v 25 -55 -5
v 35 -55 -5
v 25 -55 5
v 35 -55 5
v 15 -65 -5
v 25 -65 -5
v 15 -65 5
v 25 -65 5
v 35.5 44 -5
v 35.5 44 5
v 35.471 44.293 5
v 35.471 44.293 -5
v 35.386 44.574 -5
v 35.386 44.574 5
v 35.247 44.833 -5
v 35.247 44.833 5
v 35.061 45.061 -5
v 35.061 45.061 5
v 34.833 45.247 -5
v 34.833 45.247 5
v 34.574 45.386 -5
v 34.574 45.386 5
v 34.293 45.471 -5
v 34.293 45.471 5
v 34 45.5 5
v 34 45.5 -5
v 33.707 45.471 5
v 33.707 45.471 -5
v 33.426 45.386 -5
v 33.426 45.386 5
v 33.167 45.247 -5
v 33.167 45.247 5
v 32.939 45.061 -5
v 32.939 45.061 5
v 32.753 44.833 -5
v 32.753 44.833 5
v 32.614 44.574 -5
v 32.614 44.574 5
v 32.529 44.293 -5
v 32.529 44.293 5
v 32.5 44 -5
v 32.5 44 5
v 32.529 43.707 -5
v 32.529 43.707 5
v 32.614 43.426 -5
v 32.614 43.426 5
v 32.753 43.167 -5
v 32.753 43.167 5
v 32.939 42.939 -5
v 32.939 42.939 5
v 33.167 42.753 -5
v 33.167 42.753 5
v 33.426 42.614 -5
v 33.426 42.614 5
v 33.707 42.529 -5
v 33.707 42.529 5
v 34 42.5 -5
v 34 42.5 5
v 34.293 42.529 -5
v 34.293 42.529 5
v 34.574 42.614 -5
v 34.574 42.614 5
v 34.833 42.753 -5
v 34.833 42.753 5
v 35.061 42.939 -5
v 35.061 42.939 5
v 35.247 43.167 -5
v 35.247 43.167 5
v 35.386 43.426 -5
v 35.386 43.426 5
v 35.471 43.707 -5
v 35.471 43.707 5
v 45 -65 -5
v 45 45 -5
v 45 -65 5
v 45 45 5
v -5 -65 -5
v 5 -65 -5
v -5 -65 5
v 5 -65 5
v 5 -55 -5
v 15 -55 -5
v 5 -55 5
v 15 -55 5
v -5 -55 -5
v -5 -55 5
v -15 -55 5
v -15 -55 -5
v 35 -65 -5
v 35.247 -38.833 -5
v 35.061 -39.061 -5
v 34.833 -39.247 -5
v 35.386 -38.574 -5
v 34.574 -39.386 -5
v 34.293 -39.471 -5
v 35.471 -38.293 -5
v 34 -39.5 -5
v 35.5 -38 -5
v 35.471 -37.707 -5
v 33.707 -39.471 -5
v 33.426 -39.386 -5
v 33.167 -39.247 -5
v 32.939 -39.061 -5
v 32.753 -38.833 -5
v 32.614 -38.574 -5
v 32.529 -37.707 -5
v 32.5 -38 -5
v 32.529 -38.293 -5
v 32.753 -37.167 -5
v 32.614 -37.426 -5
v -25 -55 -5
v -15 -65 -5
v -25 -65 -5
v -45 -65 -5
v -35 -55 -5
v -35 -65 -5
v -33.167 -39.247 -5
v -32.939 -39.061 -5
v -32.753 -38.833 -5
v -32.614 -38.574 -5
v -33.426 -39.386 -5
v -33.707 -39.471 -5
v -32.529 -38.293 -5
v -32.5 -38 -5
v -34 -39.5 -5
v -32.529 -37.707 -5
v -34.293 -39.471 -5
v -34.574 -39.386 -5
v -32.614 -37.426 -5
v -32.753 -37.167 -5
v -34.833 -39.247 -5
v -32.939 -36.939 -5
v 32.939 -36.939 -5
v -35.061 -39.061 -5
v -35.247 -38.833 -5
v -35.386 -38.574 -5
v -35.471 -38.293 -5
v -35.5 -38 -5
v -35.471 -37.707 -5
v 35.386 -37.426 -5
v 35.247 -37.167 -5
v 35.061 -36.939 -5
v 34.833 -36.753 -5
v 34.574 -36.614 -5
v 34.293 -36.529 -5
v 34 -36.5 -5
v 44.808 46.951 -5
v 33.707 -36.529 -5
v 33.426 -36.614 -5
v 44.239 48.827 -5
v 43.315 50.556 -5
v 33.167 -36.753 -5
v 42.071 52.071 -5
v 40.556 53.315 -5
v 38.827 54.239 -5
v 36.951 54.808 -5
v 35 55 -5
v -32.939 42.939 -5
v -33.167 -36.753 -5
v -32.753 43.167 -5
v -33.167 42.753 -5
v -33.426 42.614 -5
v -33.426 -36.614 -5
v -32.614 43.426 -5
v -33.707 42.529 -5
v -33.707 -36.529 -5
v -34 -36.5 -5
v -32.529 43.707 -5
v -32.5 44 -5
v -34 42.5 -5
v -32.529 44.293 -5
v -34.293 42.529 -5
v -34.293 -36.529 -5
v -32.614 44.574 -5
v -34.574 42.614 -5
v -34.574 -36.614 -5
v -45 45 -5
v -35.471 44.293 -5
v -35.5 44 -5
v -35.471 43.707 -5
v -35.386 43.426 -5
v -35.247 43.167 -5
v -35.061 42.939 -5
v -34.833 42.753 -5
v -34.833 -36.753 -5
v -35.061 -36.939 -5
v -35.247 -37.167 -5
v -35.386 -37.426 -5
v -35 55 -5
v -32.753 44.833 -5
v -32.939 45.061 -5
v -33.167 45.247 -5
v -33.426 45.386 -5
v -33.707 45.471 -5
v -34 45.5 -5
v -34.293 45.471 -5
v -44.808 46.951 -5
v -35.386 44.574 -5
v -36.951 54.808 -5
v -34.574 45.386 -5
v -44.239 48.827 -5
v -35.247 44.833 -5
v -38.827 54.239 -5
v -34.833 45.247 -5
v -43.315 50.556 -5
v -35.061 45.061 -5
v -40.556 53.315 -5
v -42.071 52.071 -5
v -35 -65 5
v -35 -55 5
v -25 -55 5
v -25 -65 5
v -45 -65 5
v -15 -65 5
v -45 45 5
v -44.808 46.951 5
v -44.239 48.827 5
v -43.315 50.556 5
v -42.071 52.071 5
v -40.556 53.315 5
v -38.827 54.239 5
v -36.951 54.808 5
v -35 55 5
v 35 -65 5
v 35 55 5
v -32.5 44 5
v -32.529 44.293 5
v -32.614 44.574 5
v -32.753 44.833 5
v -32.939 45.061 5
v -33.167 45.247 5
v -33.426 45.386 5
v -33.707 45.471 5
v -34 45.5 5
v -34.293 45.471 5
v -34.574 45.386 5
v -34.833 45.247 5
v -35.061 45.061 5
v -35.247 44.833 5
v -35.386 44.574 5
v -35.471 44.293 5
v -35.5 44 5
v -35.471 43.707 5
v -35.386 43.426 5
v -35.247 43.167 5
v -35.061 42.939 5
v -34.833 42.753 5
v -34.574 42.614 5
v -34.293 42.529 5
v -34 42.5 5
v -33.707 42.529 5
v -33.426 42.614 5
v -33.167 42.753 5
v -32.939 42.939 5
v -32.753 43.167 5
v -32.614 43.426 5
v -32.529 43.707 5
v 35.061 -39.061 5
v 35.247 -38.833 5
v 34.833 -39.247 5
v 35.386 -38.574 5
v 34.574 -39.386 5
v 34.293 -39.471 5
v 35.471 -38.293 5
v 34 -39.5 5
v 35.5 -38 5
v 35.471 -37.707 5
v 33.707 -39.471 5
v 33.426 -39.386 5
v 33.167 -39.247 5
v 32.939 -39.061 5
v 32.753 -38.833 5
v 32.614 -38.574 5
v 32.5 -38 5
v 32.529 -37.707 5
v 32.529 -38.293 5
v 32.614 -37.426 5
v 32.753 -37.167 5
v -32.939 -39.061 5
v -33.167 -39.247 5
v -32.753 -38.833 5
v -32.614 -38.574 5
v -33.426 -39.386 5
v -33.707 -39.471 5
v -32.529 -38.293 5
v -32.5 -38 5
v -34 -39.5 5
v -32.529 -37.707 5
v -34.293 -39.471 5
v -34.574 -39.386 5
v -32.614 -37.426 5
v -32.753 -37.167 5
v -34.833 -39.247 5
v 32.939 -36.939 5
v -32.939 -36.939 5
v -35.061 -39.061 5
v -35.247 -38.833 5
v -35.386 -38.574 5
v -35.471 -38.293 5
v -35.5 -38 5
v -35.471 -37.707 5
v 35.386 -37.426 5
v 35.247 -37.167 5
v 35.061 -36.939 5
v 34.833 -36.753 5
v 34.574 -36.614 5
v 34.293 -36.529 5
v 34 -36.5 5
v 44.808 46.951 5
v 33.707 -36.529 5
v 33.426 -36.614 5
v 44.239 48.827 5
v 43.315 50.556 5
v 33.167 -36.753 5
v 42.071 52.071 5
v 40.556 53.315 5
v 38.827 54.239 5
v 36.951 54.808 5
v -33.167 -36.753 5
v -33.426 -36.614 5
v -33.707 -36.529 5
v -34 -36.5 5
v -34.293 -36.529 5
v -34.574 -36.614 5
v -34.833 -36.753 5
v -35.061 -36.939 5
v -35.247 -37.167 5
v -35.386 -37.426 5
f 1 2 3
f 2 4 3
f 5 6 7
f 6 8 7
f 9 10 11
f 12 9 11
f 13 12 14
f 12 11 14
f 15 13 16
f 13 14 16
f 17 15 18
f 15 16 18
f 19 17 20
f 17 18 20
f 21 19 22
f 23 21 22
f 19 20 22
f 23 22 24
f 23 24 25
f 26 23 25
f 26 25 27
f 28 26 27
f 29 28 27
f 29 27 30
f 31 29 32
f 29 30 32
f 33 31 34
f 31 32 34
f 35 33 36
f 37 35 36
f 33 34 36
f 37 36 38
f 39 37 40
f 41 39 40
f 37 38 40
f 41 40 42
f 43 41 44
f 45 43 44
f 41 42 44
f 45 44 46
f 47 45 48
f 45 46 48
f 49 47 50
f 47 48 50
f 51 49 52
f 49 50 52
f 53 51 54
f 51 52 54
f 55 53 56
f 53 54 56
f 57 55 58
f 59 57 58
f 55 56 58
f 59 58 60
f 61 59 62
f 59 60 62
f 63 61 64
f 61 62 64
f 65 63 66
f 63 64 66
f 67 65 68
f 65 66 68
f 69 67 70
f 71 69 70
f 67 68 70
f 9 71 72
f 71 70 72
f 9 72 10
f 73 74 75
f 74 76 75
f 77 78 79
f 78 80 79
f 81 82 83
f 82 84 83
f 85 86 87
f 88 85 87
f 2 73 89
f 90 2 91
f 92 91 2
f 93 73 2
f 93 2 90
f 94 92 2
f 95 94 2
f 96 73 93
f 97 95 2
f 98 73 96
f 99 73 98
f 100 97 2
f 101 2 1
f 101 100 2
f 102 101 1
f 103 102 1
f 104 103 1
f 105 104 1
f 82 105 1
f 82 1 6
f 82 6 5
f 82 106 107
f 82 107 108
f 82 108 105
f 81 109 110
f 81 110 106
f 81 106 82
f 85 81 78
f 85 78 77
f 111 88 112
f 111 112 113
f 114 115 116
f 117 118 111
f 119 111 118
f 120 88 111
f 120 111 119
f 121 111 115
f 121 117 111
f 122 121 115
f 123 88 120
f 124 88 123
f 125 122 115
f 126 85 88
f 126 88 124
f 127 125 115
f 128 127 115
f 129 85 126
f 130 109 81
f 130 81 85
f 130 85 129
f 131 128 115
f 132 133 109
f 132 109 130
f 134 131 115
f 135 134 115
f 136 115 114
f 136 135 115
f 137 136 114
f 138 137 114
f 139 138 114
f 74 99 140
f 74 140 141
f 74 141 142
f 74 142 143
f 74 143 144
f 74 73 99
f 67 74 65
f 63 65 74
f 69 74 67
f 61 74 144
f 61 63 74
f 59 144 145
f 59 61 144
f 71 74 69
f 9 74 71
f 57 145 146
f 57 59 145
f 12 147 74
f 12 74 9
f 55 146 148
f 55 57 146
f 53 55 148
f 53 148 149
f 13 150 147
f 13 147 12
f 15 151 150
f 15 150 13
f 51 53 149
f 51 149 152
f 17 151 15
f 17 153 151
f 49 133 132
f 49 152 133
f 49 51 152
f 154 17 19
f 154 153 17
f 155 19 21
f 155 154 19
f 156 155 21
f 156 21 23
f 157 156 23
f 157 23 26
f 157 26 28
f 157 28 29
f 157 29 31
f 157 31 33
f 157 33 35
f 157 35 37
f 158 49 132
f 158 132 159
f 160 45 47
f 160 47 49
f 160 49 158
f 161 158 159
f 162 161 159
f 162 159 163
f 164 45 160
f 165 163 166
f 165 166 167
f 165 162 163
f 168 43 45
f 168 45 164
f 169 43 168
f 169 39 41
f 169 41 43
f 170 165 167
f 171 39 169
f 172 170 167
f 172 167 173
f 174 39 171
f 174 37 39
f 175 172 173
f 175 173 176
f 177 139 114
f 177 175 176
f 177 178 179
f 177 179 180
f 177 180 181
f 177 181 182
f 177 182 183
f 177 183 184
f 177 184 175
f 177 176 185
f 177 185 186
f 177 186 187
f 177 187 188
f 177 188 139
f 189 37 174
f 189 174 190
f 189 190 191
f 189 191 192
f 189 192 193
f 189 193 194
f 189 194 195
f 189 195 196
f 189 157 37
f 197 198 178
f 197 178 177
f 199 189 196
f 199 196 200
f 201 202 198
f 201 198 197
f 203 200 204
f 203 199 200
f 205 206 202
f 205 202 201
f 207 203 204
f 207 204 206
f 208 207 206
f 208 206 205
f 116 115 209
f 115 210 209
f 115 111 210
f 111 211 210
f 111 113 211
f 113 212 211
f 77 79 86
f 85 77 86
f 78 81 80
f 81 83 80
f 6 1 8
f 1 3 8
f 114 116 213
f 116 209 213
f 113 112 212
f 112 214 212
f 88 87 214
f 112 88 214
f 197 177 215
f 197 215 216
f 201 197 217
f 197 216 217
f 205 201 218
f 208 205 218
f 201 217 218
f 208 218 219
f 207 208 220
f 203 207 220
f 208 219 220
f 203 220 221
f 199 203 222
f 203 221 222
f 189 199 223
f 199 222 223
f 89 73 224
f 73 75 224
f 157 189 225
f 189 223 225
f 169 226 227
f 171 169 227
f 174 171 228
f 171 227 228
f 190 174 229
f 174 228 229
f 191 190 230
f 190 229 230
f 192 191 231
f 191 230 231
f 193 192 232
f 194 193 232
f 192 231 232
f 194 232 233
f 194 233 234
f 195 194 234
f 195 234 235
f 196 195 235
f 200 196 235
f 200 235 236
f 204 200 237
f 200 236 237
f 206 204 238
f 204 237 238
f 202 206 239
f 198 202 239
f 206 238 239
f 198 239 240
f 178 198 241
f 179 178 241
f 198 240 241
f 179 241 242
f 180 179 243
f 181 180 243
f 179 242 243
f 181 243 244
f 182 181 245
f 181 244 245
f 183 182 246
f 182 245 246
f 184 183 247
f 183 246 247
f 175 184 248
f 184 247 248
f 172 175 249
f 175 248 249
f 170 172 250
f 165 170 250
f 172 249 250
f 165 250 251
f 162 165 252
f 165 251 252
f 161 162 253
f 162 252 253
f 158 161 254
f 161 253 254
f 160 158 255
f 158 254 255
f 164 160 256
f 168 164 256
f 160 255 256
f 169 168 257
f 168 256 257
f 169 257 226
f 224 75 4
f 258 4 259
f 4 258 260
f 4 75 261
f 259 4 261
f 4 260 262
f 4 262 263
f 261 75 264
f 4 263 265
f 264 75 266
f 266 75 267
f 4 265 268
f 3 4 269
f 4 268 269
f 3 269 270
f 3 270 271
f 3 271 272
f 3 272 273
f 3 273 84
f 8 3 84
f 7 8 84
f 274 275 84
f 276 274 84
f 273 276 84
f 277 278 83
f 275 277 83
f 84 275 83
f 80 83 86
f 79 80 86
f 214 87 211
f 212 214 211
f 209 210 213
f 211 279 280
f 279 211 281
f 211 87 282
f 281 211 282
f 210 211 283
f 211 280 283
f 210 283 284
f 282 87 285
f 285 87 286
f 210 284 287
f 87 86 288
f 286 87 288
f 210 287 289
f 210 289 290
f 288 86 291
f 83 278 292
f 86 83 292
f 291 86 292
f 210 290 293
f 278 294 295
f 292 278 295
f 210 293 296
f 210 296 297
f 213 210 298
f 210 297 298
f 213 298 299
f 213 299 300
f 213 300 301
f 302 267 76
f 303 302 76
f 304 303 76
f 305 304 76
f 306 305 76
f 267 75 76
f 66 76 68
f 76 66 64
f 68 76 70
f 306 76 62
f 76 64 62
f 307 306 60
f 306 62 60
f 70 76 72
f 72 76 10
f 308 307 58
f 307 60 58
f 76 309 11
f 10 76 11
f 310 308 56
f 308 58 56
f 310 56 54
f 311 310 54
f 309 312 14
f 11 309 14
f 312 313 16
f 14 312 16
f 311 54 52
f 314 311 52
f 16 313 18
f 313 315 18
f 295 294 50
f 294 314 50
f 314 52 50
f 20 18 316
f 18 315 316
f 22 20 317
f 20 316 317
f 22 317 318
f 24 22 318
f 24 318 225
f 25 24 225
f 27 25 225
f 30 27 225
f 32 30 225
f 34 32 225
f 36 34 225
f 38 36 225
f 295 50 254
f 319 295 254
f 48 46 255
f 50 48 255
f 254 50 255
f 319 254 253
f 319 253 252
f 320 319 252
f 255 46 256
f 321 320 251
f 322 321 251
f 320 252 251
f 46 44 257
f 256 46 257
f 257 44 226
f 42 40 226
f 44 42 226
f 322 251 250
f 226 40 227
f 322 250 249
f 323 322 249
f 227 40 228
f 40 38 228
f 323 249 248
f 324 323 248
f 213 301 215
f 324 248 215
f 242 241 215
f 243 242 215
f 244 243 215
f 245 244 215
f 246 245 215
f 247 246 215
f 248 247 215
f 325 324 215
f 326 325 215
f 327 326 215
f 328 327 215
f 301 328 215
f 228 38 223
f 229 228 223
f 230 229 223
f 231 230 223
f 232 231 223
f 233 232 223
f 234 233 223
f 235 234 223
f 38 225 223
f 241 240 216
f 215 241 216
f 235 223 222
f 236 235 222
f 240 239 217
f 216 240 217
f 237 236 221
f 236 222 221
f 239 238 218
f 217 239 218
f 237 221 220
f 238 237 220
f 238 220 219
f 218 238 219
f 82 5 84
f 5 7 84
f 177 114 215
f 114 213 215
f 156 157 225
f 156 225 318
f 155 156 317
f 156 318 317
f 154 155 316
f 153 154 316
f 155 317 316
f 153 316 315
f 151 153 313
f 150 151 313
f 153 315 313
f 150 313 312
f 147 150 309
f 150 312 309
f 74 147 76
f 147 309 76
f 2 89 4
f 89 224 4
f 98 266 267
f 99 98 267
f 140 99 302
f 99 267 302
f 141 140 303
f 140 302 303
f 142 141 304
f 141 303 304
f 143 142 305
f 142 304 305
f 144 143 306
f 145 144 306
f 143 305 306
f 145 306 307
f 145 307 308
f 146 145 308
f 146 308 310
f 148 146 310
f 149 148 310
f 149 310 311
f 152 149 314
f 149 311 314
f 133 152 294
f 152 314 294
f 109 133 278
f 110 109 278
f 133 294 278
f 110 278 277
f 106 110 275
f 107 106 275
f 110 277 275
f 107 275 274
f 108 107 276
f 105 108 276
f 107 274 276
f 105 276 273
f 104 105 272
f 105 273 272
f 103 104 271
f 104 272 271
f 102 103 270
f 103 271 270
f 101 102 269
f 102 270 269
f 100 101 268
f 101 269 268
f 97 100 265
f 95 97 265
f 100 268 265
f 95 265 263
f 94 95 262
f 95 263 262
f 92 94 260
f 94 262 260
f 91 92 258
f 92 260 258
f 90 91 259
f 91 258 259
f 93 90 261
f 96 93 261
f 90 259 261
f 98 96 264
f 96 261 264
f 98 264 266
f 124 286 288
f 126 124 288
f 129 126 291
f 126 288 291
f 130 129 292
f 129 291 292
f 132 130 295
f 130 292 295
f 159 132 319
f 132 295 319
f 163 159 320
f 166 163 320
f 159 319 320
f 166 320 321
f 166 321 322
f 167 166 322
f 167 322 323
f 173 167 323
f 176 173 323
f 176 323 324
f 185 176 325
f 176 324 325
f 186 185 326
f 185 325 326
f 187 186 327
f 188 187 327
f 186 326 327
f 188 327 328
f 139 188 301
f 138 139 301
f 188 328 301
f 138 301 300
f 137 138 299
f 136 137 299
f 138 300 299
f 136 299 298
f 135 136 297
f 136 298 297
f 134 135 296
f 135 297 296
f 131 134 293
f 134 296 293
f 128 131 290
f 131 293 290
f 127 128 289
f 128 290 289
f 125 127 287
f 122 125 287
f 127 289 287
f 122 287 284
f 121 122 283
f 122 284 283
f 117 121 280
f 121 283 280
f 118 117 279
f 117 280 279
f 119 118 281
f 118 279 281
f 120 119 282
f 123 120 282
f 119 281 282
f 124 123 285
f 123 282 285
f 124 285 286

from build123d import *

# Parameters (mm, degrees)
EXTRUDE_2_DEPTH     = 5
SKETCH_3_R          = 1.5
CUT_EXTRUDE_1_DEPTH = 10


with BuildPart() as part:
    # Эскиз1 → Бобышка-Вытянуть2 (new, symmetric)
    with BuildSketch(Plane.XY):
        with BuildLine():
            Line((-15, -55), (-15, -65))
            Line((-15, -65), (-25, -65))
            Line((-25, -65), (-25, -55))
            Line((-25, -55), (-35, -55))
            Line((-35, -55), (-35, -65))
            Line((-35, -65), (-45, -65))
            Line((-45, -65), (-45, -55))
            Line((-45, -55), (-45, 45))
            ThreePointArc((-45, 45), (-42.071067812, 52.071067812), (-35, 55))
            Line((-35, 55), (35, 55))
            ThreePointArc((35, 55), (42.071067812, 52.071067812), (45, 45))
            Line((45, 45), (45, -55))
            Line((45, -55), (45, -65))
            Line((45, -65), (35, -65))
            Line((35, -65), (35, -55))
            Line((35, -55), (25, -55))
            Line((25, -55), (25, -65))
            Line((25, -65), (15, -65))
            Line((15, -65), (15, -55))
            Line((15, -55), (5, -55))
            Line((5, -55), (5, -65))
            Line((5, -65), (-5, -65))
            Line((-5, -65), (-5, -55))
            Line((-5, -55), (-15, -55))
        make_face()
    extrude(amount=EXTRUDE_2_DEPTH, both=True)

    # Эскиз3 → Вырез-Вытянуть1 (cut)
    with BuildSketch(Plane.XY.offset(5)):
        with Locations((-34, 44)):
            Circle(SKETCH_3_R)
        with Locations((34, 44)):
            Circle(SKETCH_3_R)
        with Locations((34, -38)):
            Circle(SKETCH_3_R)
        with Locations((-34, -38)):
            Circle(SKETCH_3_R)
    extrude(amount=-CUT_EXTRUDE_1_DEPTH, mode=Mode.SUBTRACT)


solid = part.part
